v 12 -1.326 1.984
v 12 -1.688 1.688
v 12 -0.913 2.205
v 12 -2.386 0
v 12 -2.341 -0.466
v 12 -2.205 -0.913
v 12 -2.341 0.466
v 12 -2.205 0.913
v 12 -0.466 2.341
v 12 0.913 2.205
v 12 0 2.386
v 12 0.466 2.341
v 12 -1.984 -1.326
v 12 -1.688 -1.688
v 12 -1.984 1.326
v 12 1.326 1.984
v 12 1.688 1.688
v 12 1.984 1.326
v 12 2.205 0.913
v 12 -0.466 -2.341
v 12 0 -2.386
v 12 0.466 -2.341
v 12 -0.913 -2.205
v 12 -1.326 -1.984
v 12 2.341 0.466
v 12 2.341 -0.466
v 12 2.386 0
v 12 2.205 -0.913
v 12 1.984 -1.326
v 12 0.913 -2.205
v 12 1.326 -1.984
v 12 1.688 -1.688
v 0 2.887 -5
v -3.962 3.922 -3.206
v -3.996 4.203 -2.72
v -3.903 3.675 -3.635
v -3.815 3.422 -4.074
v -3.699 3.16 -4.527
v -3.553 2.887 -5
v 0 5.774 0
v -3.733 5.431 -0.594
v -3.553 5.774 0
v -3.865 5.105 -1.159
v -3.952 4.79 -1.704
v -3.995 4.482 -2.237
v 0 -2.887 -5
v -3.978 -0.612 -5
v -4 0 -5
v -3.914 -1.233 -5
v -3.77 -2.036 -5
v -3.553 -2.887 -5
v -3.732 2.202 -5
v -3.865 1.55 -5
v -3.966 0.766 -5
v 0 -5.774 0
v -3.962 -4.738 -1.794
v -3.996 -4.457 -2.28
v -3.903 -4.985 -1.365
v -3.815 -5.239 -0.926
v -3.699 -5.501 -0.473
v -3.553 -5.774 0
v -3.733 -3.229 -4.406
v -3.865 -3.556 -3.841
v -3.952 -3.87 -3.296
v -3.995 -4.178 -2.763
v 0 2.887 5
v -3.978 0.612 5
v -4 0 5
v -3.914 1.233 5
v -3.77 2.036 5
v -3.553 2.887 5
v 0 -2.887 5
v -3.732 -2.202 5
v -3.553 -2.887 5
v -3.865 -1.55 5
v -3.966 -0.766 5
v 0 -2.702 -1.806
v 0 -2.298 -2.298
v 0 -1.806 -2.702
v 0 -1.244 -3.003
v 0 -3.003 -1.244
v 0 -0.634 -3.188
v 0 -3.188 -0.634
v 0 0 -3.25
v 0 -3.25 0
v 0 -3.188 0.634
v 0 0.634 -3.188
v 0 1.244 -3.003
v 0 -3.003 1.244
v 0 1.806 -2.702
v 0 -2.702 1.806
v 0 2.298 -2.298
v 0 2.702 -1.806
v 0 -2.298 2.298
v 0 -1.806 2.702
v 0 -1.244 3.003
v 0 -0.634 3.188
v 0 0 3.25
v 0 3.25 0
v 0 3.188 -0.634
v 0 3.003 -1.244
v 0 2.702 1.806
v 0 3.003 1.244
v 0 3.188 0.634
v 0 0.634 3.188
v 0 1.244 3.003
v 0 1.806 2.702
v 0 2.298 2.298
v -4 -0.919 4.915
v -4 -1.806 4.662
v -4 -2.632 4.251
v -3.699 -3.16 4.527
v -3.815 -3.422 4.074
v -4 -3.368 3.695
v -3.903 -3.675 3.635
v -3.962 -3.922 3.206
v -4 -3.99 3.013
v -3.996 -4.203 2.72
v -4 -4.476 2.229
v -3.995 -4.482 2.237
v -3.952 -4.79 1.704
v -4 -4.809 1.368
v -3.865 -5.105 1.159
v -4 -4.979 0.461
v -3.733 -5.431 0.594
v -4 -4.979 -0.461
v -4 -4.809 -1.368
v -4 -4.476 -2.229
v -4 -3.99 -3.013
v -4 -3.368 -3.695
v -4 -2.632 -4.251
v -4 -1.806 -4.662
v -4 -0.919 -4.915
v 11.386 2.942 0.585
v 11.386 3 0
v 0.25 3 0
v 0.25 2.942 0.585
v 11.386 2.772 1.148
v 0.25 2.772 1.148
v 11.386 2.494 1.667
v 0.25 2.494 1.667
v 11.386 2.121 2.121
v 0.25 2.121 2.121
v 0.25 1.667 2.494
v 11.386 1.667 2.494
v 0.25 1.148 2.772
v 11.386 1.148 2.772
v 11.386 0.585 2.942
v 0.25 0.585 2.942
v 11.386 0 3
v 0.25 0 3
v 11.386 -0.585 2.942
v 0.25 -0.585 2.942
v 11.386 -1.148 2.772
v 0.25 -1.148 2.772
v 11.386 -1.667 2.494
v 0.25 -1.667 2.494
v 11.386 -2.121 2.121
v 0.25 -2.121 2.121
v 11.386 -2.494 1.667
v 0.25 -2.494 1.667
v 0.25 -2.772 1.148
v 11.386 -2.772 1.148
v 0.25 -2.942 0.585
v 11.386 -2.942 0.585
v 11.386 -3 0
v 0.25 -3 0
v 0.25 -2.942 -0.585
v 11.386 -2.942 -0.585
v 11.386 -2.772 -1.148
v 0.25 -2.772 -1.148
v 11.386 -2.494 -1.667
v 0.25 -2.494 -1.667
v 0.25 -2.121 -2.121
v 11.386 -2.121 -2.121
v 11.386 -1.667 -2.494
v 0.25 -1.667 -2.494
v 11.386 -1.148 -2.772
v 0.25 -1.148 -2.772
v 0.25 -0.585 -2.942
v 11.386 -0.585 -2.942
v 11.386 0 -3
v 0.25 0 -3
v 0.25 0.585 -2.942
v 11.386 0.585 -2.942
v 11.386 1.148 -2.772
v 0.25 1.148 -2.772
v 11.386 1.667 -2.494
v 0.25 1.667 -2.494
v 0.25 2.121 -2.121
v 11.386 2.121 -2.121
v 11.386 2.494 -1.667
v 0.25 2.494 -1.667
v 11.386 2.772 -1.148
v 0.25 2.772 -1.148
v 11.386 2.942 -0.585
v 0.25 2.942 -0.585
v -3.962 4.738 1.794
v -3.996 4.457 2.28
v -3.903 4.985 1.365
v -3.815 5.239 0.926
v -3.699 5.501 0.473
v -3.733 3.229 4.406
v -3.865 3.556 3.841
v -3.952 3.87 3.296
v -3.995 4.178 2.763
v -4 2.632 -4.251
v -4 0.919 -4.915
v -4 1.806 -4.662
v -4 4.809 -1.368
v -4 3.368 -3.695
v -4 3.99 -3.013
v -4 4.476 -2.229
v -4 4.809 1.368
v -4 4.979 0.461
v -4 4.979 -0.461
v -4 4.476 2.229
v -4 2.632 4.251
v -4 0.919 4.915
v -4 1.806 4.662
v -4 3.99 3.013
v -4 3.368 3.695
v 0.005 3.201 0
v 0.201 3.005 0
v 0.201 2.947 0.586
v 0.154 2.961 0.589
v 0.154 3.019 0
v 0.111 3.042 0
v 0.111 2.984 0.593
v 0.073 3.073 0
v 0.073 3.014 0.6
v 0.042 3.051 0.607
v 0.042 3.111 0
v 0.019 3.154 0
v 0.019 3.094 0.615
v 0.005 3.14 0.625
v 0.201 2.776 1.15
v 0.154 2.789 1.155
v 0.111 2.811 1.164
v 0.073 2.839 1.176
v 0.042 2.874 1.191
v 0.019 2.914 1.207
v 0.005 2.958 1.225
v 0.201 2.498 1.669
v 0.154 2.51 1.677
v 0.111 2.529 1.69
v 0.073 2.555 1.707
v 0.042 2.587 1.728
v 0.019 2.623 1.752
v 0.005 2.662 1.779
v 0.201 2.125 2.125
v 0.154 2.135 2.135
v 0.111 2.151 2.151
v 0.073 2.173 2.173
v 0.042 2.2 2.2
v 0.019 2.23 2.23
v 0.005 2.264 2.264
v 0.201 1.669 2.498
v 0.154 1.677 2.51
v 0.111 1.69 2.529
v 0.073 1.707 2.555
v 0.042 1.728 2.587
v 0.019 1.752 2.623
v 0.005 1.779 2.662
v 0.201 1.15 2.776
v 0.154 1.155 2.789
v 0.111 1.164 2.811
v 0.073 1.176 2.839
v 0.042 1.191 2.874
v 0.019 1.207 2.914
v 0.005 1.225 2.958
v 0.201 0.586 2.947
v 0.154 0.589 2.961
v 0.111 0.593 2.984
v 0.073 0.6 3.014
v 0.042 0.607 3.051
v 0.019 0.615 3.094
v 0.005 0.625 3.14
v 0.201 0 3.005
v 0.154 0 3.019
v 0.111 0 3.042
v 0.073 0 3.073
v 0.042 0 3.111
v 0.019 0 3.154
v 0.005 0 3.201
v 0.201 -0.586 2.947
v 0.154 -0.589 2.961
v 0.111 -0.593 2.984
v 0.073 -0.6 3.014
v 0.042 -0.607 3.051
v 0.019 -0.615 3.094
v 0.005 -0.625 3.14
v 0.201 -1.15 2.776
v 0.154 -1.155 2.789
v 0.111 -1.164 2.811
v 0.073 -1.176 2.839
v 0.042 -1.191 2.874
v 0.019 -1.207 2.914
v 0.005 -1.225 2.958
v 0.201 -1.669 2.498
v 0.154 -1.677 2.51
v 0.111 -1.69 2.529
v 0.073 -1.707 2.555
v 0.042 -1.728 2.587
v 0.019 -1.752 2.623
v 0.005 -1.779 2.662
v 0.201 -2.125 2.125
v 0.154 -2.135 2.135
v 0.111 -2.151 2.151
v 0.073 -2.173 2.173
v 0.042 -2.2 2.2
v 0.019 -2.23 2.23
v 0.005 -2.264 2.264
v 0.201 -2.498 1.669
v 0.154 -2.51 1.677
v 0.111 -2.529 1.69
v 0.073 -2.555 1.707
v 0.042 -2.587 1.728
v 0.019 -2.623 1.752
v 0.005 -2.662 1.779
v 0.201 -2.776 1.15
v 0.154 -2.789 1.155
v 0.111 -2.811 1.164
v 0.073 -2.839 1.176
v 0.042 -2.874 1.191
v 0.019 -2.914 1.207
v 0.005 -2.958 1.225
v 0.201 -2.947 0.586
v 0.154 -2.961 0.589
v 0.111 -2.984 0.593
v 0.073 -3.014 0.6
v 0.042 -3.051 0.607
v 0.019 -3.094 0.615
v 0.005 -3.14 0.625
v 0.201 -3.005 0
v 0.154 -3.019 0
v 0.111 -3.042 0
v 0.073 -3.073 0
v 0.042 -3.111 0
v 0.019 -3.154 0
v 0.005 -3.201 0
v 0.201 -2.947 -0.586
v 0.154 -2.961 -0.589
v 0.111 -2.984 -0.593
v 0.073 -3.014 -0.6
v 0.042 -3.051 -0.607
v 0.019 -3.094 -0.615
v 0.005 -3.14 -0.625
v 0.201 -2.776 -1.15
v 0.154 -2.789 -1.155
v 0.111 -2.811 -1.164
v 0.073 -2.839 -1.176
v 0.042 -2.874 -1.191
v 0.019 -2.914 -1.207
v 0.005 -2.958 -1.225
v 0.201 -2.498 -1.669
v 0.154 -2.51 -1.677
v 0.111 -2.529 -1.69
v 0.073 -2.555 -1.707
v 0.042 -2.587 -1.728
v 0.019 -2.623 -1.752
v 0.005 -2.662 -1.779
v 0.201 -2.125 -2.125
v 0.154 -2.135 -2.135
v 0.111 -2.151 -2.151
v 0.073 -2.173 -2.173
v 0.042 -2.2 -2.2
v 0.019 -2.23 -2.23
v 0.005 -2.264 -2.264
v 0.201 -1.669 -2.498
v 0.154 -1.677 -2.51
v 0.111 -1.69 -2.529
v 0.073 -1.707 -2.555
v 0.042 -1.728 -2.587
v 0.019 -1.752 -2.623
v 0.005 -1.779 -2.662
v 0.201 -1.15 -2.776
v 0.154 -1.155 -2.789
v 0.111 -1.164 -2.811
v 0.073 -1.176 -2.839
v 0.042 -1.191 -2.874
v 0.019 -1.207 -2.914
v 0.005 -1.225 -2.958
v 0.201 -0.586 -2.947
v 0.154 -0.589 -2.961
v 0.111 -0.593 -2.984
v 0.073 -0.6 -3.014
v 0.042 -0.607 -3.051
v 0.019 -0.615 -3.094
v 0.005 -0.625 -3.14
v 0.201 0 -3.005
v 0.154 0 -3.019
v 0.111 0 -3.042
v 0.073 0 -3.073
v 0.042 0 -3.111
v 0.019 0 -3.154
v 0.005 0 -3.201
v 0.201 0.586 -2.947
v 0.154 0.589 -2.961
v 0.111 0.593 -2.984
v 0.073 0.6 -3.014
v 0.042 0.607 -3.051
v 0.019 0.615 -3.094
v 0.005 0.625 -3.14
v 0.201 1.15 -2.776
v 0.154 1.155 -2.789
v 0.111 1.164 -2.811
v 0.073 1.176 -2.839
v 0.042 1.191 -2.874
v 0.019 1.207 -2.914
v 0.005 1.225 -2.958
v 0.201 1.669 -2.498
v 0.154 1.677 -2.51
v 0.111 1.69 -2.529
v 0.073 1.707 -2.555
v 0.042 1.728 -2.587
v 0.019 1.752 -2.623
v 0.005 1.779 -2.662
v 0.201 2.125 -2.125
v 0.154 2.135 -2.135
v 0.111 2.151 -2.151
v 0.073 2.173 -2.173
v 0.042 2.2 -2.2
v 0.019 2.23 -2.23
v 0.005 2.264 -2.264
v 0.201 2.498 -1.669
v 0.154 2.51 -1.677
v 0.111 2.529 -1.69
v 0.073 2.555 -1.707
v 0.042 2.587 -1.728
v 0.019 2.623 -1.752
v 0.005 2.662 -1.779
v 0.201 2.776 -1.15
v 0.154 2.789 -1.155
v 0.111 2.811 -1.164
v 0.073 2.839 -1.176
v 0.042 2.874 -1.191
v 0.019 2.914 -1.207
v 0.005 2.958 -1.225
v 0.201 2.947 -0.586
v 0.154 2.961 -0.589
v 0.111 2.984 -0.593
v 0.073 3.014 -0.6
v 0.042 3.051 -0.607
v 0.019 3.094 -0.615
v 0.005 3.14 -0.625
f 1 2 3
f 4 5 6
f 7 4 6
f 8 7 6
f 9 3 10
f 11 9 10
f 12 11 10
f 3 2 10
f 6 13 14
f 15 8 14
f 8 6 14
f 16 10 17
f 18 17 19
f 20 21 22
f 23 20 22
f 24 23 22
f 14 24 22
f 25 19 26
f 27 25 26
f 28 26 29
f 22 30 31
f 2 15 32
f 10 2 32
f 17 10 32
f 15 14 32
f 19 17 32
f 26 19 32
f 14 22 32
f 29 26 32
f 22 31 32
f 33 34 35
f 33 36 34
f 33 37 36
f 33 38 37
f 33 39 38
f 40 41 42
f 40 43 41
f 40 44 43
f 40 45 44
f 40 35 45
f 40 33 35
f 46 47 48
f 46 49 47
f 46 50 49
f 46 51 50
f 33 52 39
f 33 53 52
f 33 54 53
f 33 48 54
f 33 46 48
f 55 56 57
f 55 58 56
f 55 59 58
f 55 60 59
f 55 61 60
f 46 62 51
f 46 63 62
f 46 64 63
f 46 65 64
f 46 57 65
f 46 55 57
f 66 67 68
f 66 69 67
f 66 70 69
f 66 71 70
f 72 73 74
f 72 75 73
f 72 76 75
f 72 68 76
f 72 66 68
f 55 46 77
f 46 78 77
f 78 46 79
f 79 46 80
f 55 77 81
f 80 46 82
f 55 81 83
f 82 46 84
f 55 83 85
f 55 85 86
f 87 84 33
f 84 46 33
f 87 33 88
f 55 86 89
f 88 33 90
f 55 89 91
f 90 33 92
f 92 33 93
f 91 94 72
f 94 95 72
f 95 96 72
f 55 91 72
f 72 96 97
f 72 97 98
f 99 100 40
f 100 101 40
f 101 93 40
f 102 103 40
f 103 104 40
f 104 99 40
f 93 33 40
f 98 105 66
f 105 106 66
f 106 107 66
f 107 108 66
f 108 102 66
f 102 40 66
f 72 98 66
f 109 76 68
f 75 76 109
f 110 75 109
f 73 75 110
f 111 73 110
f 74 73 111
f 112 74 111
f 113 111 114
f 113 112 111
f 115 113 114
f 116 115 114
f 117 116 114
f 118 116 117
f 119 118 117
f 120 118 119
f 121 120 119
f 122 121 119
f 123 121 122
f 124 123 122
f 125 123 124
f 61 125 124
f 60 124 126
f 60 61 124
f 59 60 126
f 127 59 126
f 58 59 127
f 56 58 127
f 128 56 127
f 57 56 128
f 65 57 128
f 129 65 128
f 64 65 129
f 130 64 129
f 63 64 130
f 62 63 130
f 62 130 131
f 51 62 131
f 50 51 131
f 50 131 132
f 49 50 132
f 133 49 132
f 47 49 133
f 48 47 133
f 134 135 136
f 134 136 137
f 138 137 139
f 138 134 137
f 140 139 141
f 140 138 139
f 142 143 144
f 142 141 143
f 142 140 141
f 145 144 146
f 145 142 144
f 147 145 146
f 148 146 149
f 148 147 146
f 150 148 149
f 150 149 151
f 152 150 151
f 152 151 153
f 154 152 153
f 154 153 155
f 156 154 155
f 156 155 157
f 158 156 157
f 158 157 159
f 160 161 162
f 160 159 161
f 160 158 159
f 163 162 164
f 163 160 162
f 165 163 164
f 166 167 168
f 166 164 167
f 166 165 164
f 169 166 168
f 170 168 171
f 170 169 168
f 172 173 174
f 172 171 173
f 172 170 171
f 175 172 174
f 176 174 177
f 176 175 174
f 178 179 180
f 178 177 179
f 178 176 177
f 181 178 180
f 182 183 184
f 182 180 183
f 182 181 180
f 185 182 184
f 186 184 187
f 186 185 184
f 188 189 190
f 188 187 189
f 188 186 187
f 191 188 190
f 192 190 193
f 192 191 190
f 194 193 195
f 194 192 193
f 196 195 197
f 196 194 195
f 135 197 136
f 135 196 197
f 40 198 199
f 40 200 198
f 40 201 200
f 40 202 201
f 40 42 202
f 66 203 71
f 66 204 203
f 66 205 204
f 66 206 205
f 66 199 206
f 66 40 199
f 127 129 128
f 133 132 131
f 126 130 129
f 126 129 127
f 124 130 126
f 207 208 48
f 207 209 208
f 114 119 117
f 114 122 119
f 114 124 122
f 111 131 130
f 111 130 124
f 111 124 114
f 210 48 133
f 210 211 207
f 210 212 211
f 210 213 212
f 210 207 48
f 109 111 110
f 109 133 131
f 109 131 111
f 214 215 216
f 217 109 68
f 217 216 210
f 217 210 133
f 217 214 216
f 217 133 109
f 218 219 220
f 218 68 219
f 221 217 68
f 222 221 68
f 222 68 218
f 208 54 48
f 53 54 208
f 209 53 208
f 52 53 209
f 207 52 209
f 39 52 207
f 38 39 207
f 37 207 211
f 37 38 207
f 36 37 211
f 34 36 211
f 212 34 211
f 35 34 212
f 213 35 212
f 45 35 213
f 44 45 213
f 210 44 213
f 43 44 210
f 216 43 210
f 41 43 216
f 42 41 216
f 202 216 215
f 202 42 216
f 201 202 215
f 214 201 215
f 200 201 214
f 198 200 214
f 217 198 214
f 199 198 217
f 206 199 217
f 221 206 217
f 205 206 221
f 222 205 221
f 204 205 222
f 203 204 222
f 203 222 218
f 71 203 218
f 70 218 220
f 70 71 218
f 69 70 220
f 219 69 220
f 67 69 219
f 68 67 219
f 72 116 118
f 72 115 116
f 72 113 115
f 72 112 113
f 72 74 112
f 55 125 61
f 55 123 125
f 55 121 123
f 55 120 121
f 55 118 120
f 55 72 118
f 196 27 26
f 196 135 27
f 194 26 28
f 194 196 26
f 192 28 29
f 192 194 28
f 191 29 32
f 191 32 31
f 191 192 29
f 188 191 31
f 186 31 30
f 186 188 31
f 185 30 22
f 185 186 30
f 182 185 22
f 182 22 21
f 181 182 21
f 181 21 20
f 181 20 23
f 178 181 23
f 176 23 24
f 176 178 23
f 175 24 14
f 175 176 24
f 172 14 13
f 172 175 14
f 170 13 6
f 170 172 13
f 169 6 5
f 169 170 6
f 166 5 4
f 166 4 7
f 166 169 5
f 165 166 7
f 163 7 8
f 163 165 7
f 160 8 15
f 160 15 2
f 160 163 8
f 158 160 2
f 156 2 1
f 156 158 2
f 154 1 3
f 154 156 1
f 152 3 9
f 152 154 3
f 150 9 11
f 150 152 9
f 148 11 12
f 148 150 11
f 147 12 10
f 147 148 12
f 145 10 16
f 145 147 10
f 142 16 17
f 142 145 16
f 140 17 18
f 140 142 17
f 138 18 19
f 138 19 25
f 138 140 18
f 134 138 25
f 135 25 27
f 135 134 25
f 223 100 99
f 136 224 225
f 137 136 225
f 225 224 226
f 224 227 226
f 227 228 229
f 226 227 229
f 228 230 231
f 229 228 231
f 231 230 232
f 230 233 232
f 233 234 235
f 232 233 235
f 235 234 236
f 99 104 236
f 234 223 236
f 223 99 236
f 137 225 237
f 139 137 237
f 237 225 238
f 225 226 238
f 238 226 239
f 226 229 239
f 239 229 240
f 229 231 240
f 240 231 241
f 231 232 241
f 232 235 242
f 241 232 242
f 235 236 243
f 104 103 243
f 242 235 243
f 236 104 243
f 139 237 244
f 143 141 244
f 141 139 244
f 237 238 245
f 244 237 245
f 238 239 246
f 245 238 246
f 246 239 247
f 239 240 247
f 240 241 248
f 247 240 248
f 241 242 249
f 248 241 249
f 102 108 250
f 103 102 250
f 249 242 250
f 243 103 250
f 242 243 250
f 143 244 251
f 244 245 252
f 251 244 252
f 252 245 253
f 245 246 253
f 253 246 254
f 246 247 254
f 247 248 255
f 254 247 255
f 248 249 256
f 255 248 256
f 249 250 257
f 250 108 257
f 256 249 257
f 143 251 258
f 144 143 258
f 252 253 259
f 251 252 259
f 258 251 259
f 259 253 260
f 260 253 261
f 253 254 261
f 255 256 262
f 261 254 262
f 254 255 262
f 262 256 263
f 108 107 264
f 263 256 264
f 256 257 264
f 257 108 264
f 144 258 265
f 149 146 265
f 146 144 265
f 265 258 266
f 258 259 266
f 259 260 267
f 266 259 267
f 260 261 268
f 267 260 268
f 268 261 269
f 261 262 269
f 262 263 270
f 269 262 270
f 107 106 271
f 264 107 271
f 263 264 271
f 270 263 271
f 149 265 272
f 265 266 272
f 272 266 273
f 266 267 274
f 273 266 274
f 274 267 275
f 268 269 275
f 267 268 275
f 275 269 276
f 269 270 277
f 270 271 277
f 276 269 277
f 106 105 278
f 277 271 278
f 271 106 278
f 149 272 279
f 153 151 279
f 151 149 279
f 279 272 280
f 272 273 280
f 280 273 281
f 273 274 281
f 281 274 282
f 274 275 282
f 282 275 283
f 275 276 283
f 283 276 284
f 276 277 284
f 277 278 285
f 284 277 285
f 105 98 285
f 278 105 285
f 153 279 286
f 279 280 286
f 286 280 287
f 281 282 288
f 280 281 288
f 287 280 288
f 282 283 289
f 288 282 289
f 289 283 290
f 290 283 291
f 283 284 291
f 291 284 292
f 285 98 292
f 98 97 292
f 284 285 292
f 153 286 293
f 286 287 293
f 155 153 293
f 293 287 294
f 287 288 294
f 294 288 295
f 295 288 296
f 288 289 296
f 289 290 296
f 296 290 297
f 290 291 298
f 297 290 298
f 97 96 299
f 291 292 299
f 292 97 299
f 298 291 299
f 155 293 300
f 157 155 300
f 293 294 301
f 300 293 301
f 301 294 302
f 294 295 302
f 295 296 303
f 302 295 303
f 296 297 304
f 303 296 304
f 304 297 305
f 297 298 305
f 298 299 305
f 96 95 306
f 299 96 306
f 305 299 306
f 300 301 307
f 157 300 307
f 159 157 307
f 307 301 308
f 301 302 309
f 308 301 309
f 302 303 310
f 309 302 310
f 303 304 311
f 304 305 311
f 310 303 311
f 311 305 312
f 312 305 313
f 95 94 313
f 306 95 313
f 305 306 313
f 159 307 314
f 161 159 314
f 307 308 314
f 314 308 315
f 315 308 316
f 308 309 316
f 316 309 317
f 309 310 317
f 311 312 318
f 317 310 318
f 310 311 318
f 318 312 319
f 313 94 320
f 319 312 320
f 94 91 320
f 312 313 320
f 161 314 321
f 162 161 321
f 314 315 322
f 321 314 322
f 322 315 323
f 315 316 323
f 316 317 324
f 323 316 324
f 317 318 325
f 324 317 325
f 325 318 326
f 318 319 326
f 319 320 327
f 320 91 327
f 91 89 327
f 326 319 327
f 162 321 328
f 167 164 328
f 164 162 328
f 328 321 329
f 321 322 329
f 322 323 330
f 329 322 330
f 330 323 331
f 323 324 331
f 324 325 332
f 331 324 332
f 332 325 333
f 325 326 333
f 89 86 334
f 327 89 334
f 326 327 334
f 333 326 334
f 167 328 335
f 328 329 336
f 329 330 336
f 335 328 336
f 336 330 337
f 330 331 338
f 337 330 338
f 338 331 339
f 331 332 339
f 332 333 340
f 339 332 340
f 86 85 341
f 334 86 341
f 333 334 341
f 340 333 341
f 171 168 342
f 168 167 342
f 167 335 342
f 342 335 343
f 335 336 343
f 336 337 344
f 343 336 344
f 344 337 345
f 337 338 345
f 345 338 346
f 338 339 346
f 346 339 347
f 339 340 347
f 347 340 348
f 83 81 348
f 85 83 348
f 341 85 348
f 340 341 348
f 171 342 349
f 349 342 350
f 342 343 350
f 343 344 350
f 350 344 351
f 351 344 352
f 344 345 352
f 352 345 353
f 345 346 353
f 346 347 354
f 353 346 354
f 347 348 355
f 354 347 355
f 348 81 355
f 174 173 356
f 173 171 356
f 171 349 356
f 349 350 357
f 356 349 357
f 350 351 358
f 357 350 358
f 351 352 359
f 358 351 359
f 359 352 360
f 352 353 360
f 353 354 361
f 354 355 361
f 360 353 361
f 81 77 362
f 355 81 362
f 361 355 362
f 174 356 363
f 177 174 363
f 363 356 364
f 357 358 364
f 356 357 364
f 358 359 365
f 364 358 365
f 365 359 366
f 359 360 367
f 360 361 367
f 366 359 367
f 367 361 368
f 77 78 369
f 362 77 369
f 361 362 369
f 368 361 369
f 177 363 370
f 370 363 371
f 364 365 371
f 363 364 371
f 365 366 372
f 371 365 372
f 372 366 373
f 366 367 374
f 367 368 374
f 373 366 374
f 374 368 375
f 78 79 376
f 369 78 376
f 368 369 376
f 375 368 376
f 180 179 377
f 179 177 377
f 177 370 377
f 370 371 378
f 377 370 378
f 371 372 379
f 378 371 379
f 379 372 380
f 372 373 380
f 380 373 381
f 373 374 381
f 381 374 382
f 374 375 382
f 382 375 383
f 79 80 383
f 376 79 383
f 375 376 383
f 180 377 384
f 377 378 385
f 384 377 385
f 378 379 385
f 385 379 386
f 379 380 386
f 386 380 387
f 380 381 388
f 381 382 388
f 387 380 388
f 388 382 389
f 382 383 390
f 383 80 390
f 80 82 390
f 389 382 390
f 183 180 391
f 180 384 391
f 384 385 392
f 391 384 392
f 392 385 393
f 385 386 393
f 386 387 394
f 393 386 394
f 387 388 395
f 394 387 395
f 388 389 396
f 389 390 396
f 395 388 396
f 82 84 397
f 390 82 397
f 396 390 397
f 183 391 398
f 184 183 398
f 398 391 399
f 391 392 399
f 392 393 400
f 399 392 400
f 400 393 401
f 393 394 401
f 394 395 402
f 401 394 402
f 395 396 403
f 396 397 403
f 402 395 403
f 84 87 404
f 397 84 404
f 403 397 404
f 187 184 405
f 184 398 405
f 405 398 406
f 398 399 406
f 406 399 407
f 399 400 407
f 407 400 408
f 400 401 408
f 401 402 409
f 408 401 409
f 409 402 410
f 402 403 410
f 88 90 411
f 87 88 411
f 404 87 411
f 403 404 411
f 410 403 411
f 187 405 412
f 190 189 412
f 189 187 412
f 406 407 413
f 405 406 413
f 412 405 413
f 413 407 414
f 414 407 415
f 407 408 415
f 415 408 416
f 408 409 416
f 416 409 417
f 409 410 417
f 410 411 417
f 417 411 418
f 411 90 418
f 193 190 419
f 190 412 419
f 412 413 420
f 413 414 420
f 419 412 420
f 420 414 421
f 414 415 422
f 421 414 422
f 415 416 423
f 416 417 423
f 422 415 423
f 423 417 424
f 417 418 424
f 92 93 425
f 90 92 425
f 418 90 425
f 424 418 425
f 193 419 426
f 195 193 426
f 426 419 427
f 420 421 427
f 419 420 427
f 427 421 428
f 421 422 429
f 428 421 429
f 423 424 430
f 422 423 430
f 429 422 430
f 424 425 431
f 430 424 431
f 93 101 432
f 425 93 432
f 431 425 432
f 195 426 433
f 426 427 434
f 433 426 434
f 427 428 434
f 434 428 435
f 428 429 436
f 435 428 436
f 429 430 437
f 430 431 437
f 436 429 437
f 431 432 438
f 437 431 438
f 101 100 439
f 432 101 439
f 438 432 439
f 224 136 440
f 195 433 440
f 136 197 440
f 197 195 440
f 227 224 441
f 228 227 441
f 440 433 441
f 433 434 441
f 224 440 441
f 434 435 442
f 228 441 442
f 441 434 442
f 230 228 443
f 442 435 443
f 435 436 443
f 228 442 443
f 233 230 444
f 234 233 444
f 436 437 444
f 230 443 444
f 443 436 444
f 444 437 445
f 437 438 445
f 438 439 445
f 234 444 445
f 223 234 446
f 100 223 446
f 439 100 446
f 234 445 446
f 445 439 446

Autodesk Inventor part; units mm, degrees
ref_plane "YZ Plane" through (0, 0, 0) normal (1, 0, 0) x (0, 1, 0)
ref_plane "XZ Plane" through (0, 0, 0) normal (0, 1, 0) x (-1, 0, 0)
sketch "Sketch1" plane through (0, 0, 0) normal (0, 0, 1) x (1, 0, 0)
  line L0 (0, 3) -> (12, 3)
  line L1 (12, 3) -> (12, 0)
  line L2 (12, 0) -> (0, 0)
  line L3 (-2.4, 0) -> (14.4, 0) projected
  line L4 (0, -0.6) -> (0, 3.6) projected
  line L5 (0, 3) -> (0, 0)
  dimension "d2" = 6
  dimension "d59" = 12
revolve "Body" add sketch "Sketch1" angle 360 about axis through (12, 0, 0) along (-1, 0, 0)
sketch "Sketch2" plane through (0, 0, 0) normal (-1, 0, 0) x (0, 0, 1)
  line L0 (0, 5.7735) -> (5, 2.8868)
  line L1 (5, 2.8868) -> (5, -2.8868)
  line L2 (5, -2.8868) -> (0, -5.7735)
  line L3 (0, -5.7735) -> (-5, -2.8868)
  line L4 (-5, -2.8868) -> (-5, 2.8868)
  line L5 (-5, 2.8868) -> (0, 5.7735)
  line L6 (-7, 0) -> (7, 0) projected
  line L7 (0, 8.0829) -> (0, -8.0829) projected
  point P0 (0, 0)
  point P1 (0, 0)
  dimension "d11" = 10
extrude "Head" add sketch "Sketch2" along normal blind 4
sketch "Sketch4" plane through (0, 0, 0) normal (0, 0, 1) x (1, 0, 0)
  line L0 (-3.4226, 6) -> (-4, 5)
  line L1 (-1.1, 0) -> (-0.234, 0)
  line L2 (-4.7532, 0) -> (0.5192, 0) projected
  line L3 (-4, 6) -> (-3.4226, 6)
  line L4 (-4, 5) -> (-4, 6)
  line L5 (0, 7.2) -> (0, -1.2) projected
  dimension "d65" = 10
  dimension "d67" = 30
  dimension "d68" = 12
  dimension "d69" = 4
revolve "Chamfer1" cut sketch "Sketch4" angle 360 about axis through (-1.1, 0, 0) along (1, 0, 0)
thread "Thread" size "M6x1" designation "M6" class "6g" standard "GB Metric profile" length 11
chamfer "Chamfer2" distance 0.6135 distance2 0.6136 1 edges at (12, -3, 0) measured on face at (12, -0.8855, 0.4647)
fillet "Fillet2" radius 0.25 1 edges at (0, -3, 0)
ref_plane "Work Plane1" through (1.525, 0, 0) normal (0, 0, 1) x (1, 0, 0)
equation "\"d2\" = GD"
equation "\"d59\" = NLG"
equation "\"d11\" = SW"
equation "\"d3\" = KOH"
equation "\"d71\" = RR"
equation "\"d15\" = GEL"
equation "\"d6\" = -0.5 * SPD + 0.5 * GD"
equation "\"d65\" = SW"
equation "\"d67\" = ANG1"
equation "\"d68\" = 1.2 * SW"
equation "\"d69\" = KOH"
equation "\"NLG\" = 12"
equation "\"GD\" = NND"
equation "\"BDM\" = NND"
equation "\"KOH\" = 4"
equation "\"GEL\" = 11"
equation "\"SW\" = 10"
equation "\"SPD\" = NND - 1.2269 * PTC"
equation "\"SD2\" = NND"
equation "\"SD\" = 0"
equation "\"ANG1\" = 30deg"
equation "\"GAL\" = 0.61345 * PTC"
equation "\"GUL\" = 0.61345 * PTC"
equation "\"RR\" = 0.25"
equation "\"RR1\" = 0.1"
equation "\"WFT\" = 0"
equation "\"GD1\" = THREADDIA - 1.2269 * PTC"
equation "\"THREADDIA\" = 6"
equation "\"TOA\" = 30deg"
equation "\"FAWI\" = 90deg"
equation "\"PTC\" = 1"
equation "\"NND\" = 6"
equation "\"E0\" = 1.155 * SW"
properties part number "Hexagon bolt GB/T 5781 M6 x 12" material "Steel, Mild"
